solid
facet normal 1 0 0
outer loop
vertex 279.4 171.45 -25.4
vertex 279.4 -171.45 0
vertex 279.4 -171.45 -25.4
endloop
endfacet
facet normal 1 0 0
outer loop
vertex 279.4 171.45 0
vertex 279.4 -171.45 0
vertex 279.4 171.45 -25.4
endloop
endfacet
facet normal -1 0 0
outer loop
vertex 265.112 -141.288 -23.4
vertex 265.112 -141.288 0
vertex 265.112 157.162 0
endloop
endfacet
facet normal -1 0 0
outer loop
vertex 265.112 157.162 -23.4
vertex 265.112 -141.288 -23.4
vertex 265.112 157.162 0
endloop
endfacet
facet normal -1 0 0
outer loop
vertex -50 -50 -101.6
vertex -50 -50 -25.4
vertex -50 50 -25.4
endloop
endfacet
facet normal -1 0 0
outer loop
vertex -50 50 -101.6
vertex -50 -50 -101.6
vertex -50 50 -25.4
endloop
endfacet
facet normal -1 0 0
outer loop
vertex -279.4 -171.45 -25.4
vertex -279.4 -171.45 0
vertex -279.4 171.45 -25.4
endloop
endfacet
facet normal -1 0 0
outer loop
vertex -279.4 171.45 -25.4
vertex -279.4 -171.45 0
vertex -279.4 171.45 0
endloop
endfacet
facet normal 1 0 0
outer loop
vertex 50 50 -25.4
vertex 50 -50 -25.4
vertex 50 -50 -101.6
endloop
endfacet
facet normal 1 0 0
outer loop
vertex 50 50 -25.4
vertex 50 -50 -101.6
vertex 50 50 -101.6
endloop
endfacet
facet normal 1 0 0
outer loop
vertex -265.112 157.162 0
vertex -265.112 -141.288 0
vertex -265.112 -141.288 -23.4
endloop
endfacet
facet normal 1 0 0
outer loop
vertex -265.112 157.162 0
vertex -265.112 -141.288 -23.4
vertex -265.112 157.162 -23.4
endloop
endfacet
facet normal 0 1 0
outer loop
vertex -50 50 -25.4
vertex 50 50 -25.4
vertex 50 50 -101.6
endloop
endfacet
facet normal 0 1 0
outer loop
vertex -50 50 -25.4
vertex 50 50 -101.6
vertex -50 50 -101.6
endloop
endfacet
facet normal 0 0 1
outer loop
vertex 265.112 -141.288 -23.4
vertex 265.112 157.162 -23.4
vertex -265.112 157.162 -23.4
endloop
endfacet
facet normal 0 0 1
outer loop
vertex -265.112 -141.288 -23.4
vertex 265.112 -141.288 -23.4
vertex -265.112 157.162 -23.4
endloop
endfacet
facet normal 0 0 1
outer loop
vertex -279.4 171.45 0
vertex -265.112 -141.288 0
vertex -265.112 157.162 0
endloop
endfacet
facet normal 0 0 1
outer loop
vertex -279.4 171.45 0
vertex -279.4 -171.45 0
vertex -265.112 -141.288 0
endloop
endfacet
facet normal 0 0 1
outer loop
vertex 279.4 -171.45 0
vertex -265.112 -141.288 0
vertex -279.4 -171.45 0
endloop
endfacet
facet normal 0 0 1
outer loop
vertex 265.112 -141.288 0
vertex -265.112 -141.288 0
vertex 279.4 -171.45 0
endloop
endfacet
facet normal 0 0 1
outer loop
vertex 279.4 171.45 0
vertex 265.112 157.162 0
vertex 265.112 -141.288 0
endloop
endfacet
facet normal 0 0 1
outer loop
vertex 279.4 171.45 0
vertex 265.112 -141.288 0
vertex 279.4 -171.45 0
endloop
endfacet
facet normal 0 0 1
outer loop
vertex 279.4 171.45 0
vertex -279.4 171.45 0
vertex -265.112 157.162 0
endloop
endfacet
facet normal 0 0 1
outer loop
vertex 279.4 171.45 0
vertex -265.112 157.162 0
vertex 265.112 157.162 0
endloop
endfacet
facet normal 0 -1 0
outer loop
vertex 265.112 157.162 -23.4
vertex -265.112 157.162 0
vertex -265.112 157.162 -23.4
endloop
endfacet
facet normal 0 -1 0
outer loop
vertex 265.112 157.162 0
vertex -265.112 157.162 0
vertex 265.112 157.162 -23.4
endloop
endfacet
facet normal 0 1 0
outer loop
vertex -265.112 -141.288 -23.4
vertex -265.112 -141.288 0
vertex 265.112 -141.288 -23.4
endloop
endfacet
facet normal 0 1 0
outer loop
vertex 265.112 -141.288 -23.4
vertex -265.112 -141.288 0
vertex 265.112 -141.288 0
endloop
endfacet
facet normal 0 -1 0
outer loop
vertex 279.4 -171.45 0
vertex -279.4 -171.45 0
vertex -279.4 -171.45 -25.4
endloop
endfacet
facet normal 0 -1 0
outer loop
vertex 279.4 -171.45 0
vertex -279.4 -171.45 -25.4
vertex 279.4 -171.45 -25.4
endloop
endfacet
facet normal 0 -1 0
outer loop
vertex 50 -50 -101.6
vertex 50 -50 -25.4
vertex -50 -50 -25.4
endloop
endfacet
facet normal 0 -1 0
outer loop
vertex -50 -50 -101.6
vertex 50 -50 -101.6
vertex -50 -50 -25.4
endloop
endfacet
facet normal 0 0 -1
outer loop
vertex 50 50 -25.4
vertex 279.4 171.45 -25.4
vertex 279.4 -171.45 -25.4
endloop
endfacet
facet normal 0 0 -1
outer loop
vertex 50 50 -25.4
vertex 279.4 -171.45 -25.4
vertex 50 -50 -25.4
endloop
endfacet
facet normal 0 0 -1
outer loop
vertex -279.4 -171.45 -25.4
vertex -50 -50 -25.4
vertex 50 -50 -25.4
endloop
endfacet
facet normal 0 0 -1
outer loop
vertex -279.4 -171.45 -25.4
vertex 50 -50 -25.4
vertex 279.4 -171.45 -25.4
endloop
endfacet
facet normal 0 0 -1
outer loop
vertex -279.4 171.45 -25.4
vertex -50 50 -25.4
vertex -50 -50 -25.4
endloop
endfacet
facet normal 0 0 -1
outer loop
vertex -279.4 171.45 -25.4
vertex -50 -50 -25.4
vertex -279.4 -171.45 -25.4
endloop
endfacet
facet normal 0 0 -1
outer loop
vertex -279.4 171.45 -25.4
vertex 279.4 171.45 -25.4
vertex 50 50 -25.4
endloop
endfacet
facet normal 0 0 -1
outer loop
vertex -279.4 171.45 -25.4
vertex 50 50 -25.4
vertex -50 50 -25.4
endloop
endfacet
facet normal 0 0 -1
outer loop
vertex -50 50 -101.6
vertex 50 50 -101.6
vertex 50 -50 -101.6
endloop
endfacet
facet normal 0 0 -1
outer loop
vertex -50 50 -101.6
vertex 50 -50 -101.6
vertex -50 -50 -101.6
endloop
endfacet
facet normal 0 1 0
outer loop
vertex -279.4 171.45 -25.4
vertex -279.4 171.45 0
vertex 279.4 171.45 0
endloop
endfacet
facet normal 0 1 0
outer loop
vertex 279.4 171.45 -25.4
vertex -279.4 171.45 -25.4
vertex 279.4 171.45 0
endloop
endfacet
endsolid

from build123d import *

# Parameters (mm, degrees)
SKETCH1_W           = 558.8
SKETCH1_H           = 342.9
SKETCH1_W_2         = 530.225
SKETCH1_H_2         = 298.45
BOSS_EXTRUDE1_DEPTH = 25.4
SKETCH2_W           = 530.225
SKETCH2_H           = 298.45
BOSS_EXTRUDE2_DEPTH = 2
SKETCH3_W           = 100
SKETCH3_H           = 100
BOSS_EXTRUDE3_DEPTH = 76.2


with BuildPart() as part:
    # Sketch1 → Boss-Extrude1 (new body)
    with BuildSketch(Plane.XY):
        Rectangle(SKETCH1_W, SKETCH1_H)
        with Locations((0, 7.9375)):
            Rectangle(SKETCH1_W_2, SKETCH1_H_2, mode=Mode.SUBTRACT)
    extrude(amount=-BOSS_EXTRUDE1_DEPTH)

    # Sketch2 → Boss-Extrude2 (add)
    with BuildSketch(Plane(origin=(0, 0, -25.4), x_dir=(-1, 0, 0), z_dir=(0, 0, -1))):
        with Locations((0, 7.9375)):
            Rectangle(SKETCH2_W, SKETCH2_H)
    extrude(amount=-BOSS_EXTRUDE2_DEPTH)

    # Sketch3 → Boss-Extrude3 (add)
    with BuildSketch(Plane(origin=(0, 0, -25.4), x_dir=(-1, 0, 0), z_dir=(0, 0, -1))):
        Rectangle(SKETCH3_W, SKETCH3_H)
    extrude(amount=BOSS_EXTRUDE3_DEPTH)


solid = part.part
